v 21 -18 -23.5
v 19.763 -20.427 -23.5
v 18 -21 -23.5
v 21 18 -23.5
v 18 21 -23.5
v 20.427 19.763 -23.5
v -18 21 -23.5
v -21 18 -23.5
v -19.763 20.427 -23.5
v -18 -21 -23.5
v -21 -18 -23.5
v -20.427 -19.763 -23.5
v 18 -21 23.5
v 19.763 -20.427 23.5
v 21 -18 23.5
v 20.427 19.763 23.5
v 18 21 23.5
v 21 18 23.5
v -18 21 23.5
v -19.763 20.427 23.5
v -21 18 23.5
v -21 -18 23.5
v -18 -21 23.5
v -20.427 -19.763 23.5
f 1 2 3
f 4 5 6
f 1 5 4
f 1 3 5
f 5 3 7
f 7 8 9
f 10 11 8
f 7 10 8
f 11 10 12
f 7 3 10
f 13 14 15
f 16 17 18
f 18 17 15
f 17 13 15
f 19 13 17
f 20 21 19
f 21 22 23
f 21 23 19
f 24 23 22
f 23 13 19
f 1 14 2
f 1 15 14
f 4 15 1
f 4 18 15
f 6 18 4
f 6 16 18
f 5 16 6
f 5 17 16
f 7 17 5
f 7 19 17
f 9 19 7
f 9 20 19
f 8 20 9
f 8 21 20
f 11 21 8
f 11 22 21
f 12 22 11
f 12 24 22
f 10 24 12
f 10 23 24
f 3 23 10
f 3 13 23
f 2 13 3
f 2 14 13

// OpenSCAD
use <common.scad>

module stepper_motor_sf2424(col = [0.16, 0.16, 0.16]) {
    body_len = 47;
    motor_sf24(body_len);
}

stepper_motor_sf2424();
